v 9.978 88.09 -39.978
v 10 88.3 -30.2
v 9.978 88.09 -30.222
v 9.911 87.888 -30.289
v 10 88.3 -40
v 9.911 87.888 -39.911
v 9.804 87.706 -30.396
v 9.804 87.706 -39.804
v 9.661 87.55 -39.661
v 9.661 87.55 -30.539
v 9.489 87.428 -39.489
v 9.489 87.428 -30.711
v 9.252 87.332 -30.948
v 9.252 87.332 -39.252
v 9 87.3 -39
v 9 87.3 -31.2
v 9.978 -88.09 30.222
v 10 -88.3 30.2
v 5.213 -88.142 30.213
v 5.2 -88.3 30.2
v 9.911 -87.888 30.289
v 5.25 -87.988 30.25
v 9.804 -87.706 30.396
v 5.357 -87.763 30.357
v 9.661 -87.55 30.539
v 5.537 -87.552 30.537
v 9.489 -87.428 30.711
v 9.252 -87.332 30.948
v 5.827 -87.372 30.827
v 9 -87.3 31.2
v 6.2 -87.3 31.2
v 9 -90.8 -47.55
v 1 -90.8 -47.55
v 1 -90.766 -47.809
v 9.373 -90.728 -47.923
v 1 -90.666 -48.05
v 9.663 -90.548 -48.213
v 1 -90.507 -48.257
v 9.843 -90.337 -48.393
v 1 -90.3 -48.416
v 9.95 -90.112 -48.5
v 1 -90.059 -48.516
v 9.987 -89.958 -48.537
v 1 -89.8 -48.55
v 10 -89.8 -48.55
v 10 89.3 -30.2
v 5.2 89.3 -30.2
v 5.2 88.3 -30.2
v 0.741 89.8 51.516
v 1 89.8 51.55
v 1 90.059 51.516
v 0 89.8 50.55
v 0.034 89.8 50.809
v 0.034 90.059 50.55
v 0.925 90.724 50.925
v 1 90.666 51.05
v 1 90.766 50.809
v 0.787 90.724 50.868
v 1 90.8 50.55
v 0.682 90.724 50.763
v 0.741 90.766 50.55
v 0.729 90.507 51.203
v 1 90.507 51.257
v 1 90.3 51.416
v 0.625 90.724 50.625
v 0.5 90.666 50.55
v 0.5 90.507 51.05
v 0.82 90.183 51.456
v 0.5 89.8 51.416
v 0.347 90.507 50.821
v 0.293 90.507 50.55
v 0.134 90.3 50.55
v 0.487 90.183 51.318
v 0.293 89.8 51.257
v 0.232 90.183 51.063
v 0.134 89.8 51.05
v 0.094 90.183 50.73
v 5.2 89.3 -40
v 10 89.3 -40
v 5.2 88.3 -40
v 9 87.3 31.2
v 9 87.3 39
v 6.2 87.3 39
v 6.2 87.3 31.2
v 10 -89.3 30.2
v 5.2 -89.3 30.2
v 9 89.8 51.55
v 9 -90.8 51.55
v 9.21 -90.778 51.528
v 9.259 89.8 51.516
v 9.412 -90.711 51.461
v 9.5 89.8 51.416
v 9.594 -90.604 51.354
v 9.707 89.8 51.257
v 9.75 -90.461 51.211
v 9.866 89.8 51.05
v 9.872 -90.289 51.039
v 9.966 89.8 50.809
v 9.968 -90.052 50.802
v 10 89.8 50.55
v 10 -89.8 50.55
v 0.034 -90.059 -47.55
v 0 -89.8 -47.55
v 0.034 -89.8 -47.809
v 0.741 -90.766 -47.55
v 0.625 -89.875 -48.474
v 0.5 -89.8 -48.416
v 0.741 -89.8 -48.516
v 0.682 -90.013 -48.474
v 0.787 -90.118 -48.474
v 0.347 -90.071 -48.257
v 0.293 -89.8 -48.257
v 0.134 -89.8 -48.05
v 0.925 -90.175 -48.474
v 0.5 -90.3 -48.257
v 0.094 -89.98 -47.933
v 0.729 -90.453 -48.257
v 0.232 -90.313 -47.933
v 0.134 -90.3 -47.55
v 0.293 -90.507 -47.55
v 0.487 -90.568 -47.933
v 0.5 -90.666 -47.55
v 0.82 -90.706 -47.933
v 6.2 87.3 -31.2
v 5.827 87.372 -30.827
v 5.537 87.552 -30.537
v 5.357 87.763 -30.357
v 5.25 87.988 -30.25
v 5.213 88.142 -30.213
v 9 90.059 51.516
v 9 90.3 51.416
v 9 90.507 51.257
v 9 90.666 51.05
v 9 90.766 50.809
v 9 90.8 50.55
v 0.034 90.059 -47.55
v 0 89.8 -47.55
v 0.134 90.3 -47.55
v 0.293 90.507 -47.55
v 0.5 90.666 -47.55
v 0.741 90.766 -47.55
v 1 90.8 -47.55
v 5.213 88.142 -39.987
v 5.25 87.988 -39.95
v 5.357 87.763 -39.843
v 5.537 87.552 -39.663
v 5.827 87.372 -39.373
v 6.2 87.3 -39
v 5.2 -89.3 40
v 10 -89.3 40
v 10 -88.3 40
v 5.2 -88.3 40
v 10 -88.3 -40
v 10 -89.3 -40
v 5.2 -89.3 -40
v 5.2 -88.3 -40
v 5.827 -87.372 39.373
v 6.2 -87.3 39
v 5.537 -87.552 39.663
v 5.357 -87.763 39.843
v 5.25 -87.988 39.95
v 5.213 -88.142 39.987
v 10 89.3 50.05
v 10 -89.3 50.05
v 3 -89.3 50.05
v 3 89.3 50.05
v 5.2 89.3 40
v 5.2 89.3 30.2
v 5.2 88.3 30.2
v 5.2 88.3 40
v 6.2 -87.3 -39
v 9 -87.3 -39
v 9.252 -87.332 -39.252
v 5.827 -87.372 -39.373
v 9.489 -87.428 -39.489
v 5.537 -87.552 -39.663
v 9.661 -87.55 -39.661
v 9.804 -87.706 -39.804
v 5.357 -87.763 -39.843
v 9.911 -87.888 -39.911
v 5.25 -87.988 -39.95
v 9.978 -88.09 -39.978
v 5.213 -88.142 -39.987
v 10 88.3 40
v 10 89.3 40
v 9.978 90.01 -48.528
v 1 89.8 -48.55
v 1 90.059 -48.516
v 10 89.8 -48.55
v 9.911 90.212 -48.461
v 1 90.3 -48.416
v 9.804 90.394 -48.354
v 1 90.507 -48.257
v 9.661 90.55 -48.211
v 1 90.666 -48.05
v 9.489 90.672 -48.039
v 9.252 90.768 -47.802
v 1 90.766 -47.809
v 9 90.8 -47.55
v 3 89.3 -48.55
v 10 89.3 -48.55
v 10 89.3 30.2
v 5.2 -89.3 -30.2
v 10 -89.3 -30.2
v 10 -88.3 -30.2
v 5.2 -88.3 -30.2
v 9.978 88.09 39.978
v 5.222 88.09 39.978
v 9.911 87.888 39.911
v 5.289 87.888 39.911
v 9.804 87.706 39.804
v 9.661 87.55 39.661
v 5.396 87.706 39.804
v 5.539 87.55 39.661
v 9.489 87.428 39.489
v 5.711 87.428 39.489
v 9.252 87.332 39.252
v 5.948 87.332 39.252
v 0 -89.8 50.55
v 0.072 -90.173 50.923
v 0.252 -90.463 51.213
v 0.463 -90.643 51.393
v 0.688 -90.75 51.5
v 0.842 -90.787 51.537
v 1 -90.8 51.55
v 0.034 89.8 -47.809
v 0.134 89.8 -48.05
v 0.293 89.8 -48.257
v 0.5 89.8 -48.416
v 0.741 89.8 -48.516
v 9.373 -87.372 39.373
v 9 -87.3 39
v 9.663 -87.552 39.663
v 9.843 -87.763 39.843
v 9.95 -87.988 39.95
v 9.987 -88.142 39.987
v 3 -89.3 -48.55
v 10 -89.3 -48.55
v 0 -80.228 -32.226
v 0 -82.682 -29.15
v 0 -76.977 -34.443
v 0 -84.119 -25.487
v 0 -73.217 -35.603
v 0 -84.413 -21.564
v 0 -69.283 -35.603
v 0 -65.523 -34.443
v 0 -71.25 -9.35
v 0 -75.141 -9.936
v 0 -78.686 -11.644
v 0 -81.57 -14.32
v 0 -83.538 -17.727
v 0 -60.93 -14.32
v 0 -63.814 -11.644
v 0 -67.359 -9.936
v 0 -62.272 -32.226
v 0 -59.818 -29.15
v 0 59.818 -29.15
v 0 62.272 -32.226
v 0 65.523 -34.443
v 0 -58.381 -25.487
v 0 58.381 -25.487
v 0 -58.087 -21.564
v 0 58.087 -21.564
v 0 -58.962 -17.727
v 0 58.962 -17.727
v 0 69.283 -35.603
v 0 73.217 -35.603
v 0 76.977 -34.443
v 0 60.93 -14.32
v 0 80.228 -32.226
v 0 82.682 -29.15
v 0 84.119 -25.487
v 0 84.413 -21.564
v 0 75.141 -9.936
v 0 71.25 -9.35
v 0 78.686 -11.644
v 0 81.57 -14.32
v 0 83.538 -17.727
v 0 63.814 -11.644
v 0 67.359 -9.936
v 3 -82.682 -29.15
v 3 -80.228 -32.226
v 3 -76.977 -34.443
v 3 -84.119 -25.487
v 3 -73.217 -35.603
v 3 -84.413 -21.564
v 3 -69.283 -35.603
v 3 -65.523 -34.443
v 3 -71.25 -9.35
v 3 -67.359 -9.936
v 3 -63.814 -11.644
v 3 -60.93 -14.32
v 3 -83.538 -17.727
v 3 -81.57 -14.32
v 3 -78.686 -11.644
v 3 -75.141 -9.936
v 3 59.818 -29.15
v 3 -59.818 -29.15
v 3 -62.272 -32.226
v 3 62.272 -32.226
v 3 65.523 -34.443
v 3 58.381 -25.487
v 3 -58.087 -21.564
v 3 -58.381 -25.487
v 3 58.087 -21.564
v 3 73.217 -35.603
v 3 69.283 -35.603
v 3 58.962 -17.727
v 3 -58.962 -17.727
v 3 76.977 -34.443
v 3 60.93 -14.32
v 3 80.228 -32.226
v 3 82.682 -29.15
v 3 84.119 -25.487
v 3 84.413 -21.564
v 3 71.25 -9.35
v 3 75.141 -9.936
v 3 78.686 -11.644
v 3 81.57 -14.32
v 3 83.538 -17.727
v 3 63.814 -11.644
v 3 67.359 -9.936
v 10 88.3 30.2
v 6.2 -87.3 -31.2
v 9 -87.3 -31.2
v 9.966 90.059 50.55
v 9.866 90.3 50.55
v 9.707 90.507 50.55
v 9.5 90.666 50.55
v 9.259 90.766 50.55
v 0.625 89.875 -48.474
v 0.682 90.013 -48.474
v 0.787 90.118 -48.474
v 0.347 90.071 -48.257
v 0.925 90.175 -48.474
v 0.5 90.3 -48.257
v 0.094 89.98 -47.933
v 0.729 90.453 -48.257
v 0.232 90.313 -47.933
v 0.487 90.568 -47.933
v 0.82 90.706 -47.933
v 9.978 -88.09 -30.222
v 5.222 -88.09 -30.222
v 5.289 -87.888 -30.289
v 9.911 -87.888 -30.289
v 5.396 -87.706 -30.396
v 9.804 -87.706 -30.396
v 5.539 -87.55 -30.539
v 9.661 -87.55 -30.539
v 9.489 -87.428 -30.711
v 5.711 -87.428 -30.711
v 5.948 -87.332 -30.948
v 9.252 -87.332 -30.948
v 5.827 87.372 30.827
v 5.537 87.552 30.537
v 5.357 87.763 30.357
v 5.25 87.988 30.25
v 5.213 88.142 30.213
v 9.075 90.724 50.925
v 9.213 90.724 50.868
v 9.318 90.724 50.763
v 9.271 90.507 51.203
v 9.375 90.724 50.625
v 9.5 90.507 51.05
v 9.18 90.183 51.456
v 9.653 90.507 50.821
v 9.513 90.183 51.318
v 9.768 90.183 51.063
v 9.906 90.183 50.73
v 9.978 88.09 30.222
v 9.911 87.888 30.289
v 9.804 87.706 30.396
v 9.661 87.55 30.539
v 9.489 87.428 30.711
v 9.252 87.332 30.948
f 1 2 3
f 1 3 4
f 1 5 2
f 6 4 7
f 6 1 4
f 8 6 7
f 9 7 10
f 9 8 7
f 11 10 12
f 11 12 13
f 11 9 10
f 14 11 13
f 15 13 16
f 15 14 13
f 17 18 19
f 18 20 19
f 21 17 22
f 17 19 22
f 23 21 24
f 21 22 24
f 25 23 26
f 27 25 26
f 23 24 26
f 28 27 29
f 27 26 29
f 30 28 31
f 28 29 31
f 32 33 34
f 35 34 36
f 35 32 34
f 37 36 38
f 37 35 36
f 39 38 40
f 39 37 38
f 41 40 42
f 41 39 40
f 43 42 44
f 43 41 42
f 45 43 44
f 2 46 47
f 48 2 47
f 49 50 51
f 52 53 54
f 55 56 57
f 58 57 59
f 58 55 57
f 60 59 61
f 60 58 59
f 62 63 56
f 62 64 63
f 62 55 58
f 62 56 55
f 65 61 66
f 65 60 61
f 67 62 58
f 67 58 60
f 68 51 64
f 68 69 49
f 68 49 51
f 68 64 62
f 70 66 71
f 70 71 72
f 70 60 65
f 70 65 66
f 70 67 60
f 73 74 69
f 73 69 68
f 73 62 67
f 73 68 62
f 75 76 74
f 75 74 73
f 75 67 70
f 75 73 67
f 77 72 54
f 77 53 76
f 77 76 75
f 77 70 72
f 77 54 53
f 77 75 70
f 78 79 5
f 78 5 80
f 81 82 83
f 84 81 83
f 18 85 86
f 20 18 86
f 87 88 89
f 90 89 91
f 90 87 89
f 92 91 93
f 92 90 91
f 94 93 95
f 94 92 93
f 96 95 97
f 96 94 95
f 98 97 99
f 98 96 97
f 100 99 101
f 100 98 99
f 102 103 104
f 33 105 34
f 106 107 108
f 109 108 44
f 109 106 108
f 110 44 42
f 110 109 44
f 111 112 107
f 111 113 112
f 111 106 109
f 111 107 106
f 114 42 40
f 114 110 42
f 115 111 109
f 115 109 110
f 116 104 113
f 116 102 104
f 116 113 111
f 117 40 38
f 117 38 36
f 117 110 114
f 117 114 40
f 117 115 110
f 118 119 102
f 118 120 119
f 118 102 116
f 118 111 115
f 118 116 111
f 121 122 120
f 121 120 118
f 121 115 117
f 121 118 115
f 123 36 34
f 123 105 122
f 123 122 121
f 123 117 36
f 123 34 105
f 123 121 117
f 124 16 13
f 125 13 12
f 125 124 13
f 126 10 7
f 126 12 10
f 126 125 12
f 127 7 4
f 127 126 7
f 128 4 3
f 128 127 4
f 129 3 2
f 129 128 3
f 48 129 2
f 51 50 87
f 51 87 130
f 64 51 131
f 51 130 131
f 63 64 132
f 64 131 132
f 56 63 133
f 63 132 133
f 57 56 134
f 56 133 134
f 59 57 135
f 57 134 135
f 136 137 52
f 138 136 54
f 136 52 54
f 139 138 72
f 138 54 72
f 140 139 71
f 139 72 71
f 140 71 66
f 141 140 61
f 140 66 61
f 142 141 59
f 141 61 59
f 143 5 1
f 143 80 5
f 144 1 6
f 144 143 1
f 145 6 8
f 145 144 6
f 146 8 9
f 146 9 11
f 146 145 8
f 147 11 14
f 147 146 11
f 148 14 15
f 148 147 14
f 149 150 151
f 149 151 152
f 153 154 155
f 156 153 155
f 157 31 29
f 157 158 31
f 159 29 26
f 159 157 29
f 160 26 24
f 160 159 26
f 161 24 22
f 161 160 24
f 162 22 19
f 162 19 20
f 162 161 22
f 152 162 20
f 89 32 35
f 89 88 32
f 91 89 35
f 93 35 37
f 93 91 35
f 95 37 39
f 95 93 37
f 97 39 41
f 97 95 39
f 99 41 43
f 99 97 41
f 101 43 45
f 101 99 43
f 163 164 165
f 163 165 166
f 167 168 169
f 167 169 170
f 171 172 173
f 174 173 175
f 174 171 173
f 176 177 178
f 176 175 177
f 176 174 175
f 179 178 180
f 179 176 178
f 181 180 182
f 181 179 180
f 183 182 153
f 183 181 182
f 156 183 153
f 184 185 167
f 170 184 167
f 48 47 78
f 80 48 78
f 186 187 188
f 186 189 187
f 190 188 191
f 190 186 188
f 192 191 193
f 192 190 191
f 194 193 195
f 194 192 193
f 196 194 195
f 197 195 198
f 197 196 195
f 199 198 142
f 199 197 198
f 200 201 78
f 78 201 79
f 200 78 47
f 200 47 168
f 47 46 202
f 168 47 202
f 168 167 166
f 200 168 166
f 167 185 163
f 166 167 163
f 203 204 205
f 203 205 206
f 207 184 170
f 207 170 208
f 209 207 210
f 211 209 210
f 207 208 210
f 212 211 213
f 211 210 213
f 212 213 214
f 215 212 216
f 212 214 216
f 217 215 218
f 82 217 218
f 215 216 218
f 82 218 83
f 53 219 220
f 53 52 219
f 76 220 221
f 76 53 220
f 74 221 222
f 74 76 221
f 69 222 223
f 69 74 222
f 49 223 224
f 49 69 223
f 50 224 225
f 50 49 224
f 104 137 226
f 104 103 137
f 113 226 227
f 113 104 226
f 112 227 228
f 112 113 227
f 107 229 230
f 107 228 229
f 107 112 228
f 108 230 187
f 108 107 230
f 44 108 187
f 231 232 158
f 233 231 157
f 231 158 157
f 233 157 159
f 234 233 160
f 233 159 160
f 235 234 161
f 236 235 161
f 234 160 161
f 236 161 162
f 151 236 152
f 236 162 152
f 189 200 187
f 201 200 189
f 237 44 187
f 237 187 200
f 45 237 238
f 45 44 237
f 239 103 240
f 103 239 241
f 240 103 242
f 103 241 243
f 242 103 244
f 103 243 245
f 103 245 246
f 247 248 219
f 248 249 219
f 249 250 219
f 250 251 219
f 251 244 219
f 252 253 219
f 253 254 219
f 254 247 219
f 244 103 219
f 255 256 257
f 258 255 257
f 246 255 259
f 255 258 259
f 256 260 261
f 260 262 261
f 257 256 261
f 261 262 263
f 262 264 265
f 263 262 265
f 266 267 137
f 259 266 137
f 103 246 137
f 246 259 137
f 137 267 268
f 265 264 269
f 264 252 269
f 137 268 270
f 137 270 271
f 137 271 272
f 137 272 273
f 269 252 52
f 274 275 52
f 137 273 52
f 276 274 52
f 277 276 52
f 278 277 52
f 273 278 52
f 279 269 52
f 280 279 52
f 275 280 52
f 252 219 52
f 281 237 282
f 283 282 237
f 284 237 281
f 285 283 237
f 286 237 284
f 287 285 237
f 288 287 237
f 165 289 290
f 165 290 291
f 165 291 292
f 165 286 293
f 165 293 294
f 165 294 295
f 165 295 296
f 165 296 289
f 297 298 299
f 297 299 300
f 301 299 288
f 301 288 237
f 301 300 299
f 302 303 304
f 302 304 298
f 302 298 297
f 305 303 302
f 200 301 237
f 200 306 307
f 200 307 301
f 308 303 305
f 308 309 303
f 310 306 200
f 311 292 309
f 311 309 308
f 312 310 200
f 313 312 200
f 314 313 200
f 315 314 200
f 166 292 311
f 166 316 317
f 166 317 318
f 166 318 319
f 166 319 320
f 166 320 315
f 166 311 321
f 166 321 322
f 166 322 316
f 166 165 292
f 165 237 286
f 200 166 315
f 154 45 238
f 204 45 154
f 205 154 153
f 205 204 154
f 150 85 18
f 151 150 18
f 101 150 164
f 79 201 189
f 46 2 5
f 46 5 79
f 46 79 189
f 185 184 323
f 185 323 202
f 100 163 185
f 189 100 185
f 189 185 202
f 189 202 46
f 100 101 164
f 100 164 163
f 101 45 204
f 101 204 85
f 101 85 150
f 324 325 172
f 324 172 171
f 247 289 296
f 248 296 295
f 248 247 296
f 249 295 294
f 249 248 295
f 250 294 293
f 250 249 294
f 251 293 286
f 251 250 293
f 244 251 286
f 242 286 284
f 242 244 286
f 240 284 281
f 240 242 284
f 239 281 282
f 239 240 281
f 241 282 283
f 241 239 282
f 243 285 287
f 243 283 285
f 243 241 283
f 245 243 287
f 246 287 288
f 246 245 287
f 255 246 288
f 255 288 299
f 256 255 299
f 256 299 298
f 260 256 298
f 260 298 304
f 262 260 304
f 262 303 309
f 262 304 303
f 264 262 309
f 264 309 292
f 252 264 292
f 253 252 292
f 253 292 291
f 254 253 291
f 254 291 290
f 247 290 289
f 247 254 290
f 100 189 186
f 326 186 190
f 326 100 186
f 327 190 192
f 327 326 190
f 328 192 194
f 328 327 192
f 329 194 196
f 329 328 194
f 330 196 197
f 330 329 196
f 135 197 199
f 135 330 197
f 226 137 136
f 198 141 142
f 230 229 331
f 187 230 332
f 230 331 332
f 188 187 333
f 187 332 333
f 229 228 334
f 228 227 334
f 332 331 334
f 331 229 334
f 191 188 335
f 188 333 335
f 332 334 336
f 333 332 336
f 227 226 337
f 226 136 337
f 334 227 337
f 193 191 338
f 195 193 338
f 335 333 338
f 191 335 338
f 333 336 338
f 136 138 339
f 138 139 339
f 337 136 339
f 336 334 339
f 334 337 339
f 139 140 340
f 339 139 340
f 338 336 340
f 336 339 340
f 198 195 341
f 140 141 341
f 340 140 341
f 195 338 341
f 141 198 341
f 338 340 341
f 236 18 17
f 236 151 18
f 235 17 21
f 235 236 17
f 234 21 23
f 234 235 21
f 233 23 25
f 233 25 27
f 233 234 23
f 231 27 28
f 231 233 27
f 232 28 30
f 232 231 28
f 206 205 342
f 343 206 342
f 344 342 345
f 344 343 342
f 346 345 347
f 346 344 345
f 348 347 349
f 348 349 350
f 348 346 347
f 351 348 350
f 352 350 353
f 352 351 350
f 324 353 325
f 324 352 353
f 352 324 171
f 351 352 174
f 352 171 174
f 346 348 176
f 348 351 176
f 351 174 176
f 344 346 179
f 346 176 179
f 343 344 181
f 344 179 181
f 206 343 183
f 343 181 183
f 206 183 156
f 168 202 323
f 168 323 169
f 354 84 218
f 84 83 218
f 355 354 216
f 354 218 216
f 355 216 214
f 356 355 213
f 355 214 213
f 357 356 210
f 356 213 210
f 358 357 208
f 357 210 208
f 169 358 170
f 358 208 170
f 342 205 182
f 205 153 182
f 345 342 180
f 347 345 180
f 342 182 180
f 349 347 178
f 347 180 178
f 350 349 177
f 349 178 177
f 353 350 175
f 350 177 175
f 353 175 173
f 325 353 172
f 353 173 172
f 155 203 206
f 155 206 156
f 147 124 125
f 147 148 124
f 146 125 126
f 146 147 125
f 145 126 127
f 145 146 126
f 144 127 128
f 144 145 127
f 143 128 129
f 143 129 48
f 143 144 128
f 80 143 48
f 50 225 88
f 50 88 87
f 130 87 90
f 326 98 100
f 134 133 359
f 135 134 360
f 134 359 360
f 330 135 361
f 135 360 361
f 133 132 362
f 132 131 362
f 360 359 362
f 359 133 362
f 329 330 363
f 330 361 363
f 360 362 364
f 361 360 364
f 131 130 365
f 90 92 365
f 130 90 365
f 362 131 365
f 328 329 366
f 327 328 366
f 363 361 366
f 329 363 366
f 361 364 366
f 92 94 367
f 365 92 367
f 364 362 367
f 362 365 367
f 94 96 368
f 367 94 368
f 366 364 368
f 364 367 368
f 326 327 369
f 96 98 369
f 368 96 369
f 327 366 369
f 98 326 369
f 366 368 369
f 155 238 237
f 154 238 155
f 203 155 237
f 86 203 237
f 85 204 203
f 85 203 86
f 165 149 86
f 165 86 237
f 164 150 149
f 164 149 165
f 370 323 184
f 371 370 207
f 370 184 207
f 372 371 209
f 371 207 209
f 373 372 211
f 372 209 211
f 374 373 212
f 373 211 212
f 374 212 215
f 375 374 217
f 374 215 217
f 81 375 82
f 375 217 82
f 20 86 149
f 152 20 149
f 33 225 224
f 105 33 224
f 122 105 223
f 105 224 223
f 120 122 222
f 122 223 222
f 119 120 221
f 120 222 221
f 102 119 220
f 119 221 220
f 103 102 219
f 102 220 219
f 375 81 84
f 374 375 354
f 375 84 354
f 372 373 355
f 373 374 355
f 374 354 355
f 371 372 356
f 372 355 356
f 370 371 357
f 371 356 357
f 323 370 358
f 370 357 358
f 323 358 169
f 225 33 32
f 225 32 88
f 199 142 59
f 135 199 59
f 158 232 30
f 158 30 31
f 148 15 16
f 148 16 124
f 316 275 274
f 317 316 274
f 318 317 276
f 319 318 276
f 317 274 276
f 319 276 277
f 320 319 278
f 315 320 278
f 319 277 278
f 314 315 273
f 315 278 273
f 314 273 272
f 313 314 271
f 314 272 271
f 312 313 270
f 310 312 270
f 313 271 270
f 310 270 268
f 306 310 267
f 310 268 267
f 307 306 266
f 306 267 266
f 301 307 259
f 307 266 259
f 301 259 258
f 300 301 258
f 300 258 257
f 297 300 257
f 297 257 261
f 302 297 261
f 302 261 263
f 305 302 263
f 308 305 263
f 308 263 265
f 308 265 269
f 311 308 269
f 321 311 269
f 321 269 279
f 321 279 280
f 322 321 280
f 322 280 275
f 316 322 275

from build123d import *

# Parameters (mm, degrees)
ESBO_O1_W                 = 181.6
ESBO_O1_H                 = 103.1
RESSALTO_EXTRUS_O1_DEPTH  = 10
ESBO_O2_W                 = 178.6
ESBO_O2_H                 = 100.1
CORTE_EXTRUS_O1_DEPTH     = 7
ESBO_O4_W                 = 4.8
ESBO_O4_H                 = 9.8
RESSALTO_EXTRUS_O2_DEPTH  = 2
ESPELHAR2_COPY_1_SKETCH_W = 4.8
ESPELHAR2_COPY_1_SKETCH_H = 9.8
ESPELHAR2_COPY_1_DEPTH    = 2
ESBO_O5_W                 = 10
ESBO_O5_H                 = 181.6
CORTE_EXTRUS_O2_DEPTH     = 3
FILETE3_R                 = 1
FILETE6_R                 = 1
FILETE7_R                 = 1
FILETE8_R                 = 1
ESBO_O6_R                 = 13.2
CORTE_EXTRUS_O3_DEPTH     = 10


with BuildPart() as part:
    # Esboço1 → Ressalto-extrusão1 (new body)
    with BuildSketch(Plane.YZ):
        Rectangle(ESBO_O1_W, ESBO_O1_H)
    extrude(amount=RESSALTO_EXTRUS_O1_DEPTH)

    # Esboço2 → Corte-extrusão1 (cut)
    with BuildSketch(Plane.YZ.offset(10)):
        Rectangle(ESBO_O2_W, ESBO_O2_H)
    extrude(amount=-CORTE_EXTRUS_O1_DEPTH, mode=Mode.SUBTRACT)

    # Esboço4 → Ressalto-extrusão2 (add)
    with BuildSketch(Plane(origin=(0, -89.3, 0), x_dir=(-1, 0, 0), z_dir=(0, 1, 0))):
        with Locations((-7.6, 35.1)):
            Rectangle(ESBO_O4_W, ESBO_O4_H)
    ressalto_extrus_o2 = extrude(amount=RESSALTO_EXTRUS_O2_DEPTH)

    # Espelhar1: Ressalto-extrusão2 across plane
    add(ressalto_extrus_o2.mirror(Plane.XY))

    # Espelhar2: Ressalto-extrusão2 across plane
    add(ressalto_extrus_o2.mirror(Plane.ZX))

    # Espelhar2 copy 1 sketch → Espelhar2 copy 1 (add)
    with BuildSketch(Plane(origin=(0, 89.3, 0), x_dir=(-1, 0, 0), z_dir=(0, -1, 0))):
        with Locations((-7.6, 35.1)):
            Rectangle(ESPELHAR2_COPY_1_SKETCH_W, ESPELHAR2_COPY_1_SKETCH_H)
    extrude(amount=ESPELHAR2_COPY_1_DEPTH)

    # Esboço5 → Corte-extrusão2 (cut)
    with BuildSketch(Plane(origin=(0, 0, -51.55), x_dir=(1, 0, 0), z_dir=(0, 0, -1))):
        with Locations((5, 0)):
            Rectangle(ESBO_O5_W, ESBO_O5_H)
    extrude(amount=-CORTE_EXTRUS_O2_DEPTH, mode=Mode.SUBTRACT)

    # Filete3
    filete3_edges = [part.edges().sort_by_distance(p)[0] for p in [
        (10, 0, 51.55),
        (10, -90.8, 1.5),
        (0, 0, 51.55),
        (0, -90.8, 1.5),
        (5, 90.8, 51.55),
        (0, 90.8, 1.5),
        (10, 90.8, 1.5),
        (0, 0, -48.55),
        (5, -90.8, -48.55),
        (5, 90.8, -48.55),
    ]]
    fillet(filete3_edges, radius=FILETE3_R)

    # Filete6
    filete6_edges = [part.edges().sort_by_distance(p)[0] for p in [
        (5.2, -87.3, 35.1),
        (7.6, -87.3, 40),
        (10, -87.3, 35.1),
        (7.6, -87.3, 30.2),
    ]]
    fillet(filete6_edges, radius=FILETE6_R)

    # Filete7
    filete7_edges = [part.edges().sort_by_distance(p)[0] for p in [
        (10, -87.3, -35.1),
        (7.6, -87.3, -30.2),
        (7.6, -87.3, -40),
        (5.2, -87.3, -35.1),
    ]]
    fillet(filete7_edges, radius=FILETE7_R)

    # Filete8
    filete8_edges = [part.edges().sort_by_distance(p)[0] for p in [
        (5.2, 87.3, -35.1),
        (7.6, 87.3, -40),
        (10, 87.3, -35.1),
        (7.6, 87.3, -30.2),
        (10, 87.3, 35.1),
        (7.6, 87.3, 30.2),
        (7.6, 87.3, 40),
        (5.2, 87.3, 35.1),
    ]]
    fillet(filete8_edges, radius=FILETE8_R)

    # Esboço6 → Corte-extrusão3 (cut)
    with BuildSketch(Plane(origin=(0, 0, 0), x_dir=(0, -1, 0), z_dir=(-1, 0, 0))):
        with Locations(Location((-71.25, -22.55, 0), (0, 0, 90))):
            Circle(ESBO_O6_R)
    corte_extrus_o3 = extrude(amount=-CORTE_EXTRUS_O3_DEPTH, mode=Mode.SUBTRACT)

    # Espelhar3: Corte-extrusão3 across plane
    add(corte_extrus_o3.mirror(Plane.ZX), mode=Mode.SUBTRACT)


solid = part.part
